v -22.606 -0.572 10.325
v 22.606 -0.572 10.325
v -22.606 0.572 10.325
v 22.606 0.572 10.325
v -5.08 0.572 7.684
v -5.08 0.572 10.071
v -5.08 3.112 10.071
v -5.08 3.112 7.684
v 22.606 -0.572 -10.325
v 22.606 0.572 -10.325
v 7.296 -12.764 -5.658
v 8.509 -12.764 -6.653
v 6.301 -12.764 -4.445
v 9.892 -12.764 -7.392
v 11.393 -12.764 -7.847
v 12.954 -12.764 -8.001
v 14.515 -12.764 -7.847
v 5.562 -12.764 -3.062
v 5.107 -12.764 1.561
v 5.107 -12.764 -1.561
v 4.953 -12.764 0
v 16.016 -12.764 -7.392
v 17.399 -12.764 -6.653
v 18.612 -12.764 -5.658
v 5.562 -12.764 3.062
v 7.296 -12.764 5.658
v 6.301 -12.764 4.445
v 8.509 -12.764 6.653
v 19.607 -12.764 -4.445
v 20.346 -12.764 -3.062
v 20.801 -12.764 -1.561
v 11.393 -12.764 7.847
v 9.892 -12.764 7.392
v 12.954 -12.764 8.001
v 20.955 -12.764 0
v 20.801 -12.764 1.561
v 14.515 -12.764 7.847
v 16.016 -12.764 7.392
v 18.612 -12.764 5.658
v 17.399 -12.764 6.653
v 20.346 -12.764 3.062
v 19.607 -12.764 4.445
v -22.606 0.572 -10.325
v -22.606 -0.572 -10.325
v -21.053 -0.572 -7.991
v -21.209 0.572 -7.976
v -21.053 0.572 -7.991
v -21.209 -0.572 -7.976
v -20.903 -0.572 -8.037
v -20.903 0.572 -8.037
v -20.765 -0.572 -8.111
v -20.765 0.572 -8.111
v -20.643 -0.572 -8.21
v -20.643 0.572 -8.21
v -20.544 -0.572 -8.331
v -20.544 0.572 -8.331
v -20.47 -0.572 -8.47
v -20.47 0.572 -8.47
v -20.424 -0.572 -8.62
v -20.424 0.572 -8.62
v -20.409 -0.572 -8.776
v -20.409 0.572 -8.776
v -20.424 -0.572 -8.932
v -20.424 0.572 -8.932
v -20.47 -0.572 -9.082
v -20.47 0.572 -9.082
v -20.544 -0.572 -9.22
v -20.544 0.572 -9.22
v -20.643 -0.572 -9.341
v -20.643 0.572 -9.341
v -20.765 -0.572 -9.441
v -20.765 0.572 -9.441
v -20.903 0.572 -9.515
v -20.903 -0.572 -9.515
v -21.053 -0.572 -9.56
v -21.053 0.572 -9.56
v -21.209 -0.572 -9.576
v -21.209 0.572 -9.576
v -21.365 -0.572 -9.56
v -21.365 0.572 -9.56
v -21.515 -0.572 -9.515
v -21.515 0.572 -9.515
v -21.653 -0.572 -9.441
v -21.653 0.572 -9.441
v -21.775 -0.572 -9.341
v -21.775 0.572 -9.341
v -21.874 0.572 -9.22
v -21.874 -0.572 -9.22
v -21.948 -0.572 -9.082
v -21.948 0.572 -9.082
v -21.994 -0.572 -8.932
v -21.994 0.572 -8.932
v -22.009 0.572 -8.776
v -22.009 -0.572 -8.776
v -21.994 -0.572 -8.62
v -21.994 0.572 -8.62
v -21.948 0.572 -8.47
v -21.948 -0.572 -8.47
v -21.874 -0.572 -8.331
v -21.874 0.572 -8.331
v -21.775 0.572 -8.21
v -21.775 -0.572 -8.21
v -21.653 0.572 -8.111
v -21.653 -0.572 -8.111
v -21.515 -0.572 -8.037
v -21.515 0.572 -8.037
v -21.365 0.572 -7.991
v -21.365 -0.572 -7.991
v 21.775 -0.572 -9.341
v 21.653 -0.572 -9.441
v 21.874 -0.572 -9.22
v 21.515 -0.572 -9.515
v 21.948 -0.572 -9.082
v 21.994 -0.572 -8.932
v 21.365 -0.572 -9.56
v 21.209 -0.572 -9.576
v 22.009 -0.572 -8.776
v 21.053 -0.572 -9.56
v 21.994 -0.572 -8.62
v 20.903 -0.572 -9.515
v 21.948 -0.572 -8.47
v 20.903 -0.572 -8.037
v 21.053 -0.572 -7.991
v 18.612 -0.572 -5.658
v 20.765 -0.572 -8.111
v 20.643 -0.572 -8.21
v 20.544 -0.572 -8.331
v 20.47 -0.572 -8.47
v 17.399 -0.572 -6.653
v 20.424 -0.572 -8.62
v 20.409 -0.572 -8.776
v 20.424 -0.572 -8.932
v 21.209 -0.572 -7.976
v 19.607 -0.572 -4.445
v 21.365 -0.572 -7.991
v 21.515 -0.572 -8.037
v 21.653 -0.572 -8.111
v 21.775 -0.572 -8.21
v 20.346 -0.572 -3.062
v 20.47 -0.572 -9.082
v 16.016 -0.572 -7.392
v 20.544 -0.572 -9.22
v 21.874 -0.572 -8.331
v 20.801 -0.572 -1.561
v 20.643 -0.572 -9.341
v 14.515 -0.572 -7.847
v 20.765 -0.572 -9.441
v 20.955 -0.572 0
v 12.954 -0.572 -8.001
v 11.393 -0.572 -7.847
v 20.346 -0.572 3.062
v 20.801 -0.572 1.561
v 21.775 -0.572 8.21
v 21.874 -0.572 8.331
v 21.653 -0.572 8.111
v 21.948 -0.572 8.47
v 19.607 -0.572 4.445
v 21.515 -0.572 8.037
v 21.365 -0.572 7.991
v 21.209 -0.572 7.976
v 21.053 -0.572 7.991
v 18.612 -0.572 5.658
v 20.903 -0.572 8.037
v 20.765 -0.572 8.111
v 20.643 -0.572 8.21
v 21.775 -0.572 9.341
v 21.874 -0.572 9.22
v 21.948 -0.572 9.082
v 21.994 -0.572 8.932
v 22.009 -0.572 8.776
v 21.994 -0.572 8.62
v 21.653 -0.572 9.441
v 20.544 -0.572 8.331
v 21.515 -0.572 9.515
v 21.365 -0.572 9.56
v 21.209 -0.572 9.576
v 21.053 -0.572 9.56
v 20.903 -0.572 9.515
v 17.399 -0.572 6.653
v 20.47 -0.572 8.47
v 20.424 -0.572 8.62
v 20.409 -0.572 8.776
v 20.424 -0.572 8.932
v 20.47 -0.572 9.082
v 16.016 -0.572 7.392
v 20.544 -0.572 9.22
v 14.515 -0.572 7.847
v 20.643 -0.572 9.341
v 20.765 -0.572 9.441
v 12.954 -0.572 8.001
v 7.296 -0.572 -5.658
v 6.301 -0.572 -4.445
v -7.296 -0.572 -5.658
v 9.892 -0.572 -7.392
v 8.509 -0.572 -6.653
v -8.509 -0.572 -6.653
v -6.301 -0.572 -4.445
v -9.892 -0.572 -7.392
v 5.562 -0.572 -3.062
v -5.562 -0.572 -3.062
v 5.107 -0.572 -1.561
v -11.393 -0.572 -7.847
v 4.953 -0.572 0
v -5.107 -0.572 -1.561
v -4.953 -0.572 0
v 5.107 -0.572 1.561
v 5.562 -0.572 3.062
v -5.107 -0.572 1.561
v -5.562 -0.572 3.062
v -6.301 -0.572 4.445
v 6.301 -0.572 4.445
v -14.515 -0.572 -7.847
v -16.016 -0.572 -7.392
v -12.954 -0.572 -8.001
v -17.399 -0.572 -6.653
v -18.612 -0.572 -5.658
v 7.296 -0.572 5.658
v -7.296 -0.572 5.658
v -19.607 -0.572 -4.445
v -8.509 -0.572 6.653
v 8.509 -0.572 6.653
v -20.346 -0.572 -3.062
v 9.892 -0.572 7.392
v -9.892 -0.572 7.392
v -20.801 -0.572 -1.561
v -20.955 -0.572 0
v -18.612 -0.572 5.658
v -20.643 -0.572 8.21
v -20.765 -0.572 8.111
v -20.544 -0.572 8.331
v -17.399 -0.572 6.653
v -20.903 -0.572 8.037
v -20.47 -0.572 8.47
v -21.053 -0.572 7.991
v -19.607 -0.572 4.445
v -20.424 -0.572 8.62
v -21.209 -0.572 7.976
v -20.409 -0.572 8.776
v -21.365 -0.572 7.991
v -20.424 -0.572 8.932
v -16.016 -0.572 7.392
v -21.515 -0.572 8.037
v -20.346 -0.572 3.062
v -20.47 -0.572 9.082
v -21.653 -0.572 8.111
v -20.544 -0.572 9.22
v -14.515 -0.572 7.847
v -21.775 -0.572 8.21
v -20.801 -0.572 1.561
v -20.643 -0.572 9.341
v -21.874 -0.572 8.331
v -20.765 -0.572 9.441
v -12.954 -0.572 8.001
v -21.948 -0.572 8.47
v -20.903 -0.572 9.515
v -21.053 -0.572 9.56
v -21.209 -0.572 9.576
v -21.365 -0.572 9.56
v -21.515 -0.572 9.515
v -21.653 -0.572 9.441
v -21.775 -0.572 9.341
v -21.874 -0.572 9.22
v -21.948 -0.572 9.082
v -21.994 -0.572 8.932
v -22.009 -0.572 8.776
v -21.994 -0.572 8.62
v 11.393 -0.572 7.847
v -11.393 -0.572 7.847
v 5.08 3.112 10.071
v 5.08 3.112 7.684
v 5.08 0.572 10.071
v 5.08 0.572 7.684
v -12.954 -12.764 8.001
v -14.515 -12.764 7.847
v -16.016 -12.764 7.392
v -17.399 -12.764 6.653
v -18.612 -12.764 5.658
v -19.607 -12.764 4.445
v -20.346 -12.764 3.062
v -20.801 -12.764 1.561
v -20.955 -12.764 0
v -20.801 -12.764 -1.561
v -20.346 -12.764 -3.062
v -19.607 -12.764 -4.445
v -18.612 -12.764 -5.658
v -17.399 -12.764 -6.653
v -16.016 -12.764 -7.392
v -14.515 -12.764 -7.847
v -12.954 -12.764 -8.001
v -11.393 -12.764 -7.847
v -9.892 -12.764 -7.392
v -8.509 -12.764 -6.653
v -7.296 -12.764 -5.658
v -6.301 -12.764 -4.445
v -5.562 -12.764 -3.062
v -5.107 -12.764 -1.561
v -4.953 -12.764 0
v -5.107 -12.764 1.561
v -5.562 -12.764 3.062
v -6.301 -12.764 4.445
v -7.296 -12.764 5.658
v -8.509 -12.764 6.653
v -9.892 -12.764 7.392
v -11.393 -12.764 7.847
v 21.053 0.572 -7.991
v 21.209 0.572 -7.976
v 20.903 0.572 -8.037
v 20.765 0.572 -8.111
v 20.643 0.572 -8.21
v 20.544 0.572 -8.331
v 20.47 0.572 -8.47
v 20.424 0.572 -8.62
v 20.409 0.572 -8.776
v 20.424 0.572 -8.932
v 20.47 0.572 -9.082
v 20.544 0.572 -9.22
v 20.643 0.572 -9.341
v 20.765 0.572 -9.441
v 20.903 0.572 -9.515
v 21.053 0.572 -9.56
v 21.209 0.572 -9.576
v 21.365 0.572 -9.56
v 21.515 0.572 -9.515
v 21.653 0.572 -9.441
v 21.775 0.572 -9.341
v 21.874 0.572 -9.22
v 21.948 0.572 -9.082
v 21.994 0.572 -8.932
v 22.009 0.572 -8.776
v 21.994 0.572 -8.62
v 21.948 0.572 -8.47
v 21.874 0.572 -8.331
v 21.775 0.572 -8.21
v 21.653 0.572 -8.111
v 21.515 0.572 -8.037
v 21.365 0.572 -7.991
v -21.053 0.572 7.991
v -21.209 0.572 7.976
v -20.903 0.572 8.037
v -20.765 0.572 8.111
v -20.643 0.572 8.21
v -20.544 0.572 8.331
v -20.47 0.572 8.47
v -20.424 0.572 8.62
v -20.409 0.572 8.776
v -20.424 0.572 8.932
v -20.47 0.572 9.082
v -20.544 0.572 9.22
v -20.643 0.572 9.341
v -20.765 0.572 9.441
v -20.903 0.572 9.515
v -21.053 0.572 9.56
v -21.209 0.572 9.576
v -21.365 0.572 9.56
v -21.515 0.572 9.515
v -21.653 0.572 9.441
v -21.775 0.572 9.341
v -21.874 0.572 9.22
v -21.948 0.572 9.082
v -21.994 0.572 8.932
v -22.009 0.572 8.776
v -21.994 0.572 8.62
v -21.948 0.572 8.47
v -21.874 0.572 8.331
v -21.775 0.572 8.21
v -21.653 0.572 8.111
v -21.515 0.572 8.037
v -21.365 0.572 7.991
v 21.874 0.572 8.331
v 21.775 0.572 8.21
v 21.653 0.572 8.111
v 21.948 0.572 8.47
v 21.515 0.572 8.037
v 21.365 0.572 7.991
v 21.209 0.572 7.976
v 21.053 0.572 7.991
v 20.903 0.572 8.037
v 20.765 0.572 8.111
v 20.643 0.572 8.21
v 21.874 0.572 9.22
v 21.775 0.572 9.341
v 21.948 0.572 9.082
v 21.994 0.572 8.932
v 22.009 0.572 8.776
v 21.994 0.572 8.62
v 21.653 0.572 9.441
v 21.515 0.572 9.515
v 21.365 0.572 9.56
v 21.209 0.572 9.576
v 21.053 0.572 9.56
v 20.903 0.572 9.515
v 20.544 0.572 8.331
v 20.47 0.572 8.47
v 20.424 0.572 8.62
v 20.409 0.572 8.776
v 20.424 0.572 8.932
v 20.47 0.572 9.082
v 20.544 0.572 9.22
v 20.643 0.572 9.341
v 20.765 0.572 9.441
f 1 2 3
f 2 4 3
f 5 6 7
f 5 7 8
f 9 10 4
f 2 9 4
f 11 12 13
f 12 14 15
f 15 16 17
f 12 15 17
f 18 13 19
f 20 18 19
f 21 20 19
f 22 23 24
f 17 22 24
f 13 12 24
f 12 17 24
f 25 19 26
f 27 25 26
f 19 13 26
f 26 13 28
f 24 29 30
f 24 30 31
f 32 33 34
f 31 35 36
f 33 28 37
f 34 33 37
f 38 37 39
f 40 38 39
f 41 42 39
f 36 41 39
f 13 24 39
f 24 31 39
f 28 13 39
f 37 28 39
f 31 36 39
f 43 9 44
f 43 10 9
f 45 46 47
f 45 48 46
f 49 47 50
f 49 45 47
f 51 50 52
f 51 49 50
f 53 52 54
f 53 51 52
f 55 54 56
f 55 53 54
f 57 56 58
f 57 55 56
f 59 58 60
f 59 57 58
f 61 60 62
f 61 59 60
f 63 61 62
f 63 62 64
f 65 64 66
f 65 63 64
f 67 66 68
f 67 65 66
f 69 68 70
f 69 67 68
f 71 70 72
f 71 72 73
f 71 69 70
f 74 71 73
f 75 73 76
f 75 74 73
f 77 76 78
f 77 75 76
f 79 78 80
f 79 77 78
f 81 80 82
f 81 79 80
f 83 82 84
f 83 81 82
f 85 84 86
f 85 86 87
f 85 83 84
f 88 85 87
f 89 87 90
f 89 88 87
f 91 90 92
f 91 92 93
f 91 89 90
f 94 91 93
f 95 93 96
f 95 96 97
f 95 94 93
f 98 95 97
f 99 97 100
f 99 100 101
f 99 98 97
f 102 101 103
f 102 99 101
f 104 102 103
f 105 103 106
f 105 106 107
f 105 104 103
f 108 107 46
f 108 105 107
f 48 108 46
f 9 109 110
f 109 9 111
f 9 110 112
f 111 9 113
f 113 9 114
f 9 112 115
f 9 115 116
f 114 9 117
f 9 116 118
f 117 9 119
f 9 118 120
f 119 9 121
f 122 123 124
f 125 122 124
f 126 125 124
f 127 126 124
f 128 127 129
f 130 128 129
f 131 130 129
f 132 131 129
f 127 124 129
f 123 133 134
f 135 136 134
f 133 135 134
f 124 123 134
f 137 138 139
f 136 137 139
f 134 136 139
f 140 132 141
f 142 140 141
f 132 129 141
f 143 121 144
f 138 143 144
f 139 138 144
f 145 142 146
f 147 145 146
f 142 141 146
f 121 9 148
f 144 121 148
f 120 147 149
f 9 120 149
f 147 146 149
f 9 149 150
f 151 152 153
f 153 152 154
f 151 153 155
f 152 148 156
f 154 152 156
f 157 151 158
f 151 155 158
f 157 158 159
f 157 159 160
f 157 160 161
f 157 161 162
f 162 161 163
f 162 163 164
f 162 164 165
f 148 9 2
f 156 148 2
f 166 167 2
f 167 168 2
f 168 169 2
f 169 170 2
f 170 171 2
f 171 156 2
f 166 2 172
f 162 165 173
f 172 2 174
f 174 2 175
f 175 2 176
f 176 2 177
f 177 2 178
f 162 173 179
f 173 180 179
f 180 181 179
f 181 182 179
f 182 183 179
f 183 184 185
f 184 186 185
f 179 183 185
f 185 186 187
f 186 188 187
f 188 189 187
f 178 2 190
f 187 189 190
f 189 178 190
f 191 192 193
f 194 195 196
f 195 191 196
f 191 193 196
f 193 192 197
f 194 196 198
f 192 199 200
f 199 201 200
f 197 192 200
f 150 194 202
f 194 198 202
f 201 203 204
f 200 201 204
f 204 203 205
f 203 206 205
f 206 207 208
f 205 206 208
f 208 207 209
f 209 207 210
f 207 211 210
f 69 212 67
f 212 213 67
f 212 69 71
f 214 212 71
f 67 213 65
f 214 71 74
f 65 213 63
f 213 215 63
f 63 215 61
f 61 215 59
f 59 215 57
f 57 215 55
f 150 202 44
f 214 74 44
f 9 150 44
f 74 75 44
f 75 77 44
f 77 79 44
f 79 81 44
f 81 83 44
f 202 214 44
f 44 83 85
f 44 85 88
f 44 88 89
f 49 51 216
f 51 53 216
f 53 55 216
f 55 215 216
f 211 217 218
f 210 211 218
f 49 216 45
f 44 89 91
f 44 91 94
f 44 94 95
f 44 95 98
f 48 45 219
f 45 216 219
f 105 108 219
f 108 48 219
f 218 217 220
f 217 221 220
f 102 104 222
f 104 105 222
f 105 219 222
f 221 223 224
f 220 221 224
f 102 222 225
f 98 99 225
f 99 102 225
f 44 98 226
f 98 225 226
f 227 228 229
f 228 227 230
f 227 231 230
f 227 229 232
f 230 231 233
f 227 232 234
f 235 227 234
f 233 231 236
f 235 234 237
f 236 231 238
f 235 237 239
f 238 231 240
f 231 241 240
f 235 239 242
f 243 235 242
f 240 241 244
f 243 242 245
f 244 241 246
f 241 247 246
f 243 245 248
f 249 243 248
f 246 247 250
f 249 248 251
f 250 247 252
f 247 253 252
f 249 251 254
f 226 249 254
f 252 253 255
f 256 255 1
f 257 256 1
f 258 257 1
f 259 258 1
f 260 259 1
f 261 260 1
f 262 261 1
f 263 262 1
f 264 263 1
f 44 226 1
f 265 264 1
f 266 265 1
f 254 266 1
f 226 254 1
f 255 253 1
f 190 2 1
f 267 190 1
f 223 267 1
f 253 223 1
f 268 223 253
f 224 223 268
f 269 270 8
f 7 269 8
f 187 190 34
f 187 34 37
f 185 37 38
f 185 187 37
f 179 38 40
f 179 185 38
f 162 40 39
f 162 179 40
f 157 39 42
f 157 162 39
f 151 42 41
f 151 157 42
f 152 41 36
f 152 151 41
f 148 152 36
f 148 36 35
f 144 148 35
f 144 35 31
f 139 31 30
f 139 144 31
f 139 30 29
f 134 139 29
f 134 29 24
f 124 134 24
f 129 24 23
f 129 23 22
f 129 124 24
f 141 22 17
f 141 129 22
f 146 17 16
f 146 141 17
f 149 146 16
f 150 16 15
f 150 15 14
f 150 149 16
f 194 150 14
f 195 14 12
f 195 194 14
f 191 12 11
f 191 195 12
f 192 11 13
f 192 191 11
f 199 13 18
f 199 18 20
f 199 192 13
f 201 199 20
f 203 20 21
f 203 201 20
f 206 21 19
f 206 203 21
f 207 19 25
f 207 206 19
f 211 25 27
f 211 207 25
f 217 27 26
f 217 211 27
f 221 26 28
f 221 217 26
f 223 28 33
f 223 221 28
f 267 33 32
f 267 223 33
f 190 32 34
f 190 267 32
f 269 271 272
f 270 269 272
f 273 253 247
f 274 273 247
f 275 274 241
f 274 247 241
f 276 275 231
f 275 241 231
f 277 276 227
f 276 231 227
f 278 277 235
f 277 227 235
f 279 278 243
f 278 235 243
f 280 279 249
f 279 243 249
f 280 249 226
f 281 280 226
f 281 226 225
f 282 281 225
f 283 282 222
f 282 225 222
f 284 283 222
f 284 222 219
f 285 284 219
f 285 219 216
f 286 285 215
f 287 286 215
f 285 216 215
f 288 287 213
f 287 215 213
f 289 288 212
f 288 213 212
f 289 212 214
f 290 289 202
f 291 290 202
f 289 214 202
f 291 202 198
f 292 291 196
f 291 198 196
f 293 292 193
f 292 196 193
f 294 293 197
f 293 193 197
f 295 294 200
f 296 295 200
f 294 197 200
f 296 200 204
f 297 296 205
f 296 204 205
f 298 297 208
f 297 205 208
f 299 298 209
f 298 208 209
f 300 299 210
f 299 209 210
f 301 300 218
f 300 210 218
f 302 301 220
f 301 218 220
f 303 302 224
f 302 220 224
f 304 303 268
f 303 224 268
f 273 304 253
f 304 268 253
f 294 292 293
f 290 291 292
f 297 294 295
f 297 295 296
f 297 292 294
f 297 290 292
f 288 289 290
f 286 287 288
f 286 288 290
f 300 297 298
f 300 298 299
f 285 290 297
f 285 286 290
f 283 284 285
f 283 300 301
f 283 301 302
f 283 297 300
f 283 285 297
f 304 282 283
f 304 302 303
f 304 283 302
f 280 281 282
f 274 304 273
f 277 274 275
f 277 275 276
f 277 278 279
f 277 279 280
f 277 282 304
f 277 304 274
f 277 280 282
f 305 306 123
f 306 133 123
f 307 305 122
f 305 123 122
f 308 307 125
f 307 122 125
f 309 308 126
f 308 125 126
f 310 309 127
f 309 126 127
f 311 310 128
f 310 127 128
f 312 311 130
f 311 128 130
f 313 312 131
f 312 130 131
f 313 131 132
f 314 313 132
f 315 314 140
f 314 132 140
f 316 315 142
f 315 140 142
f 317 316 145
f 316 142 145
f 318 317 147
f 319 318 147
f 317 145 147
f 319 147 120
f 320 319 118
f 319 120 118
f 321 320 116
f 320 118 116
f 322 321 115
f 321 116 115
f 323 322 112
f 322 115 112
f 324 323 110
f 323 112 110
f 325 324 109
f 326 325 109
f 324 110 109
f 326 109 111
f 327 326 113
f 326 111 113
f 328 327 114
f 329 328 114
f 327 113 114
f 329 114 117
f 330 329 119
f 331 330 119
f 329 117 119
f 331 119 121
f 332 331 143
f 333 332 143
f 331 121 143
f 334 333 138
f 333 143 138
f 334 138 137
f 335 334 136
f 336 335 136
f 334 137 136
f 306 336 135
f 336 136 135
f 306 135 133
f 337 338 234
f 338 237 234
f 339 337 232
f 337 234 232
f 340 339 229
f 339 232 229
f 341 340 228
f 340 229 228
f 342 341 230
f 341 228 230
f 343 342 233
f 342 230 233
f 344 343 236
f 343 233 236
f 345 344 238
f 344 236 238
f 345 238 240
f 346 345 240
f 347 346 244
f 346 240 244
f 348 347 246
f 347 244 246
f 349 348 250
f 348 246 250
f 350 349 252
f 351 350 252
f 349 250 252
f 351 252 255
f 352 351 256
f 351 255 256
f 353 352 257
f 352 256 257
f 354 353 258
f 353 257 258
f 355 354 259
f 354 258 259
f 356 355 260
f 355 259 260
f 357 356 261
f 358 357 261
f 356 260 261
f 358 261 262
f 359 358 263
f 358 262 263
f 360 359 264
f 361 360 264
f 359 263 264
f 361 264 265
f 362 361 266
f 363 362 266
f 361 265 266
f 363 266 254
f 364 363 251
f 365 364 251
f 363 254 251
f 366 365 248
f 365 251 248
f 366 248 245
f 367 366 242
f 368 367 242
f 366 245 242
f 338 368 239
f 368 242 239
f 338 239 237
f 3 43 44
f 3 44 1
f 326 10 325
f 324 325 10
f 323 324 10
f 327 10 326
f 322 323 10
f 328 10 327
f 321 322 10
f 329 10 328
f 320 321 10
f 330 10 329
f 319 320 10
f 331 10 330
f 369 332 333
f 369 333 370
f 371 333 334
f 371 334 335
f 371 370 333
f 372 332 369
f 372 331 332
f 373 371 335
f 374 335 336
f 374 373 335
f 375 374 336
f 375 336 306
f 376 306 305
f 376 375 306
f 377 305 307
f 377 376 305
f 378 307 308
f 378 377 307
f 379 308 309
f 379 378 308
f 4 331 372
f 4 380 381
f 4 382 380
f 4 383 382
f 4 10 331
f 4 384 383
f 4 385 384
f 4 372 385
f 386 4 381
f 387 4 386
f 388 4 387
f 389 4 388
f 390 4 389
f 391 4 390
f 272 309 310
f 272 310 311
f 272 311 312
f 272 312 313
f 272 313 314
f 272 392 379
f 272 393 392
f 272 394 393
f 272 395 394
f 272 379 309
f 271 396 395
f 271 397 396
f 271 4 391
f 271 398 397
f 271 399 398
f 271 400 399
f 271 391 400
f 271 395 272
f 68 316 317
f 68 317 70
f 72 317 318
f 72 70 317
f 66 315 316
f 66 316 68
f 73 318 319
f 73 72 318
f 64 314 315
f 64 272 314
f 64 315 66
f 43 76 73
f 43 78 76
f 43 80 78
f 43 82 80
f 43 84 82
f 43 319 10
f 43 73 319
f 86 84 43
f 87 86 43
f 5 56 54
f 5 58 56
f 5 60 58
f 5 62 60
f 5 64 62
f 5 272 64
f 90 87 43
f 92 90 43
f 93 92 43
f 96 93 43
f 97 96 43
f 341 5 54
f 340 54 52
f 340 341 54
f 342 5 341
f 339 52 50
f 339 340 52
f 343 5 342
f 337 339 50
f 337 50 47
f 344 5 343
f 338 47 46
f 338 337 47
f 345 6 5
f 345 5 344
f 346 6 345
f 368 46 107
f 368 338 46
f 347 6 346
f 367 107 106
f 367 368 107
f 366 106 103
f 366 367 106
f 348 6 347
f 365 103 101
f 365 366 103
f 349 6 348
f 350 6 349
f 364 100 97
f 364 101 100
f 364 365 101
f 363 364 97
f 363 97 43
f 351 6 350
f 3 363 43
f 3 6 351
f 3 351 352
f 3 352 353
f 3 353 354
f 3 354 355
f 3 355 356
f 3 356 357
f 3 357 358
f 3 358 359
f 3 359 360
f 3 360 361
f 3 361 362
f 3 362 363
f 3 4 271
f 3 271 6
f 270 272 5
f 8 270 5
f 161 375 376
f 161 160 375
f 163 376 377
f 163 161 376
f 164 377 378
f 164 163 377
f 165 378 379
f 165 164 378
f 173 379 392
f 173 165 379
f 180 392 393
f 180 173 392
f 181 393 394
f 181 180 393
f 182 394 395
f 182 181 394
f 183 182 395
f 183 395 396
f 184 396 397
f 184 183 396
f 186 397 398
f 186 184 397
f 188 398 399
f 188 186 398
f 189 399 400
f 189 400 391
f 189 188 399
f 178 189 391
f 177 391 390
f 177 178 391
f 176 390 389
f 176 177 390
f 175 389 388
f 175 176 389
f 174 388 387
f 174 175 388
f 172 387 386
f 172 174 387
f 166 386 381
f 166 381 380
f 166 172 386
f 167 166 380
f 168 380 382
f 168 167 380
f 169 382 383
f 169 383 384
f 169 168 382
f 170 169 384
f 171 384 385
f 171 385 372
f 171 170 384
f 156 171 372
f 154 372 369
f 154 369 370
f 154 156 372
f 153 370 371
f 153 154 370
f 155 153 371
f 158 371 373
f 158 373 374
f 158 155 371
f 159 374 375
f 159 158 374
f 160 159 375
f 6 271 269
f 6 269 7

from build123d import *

# Parameters (mm, degrees)
SKETCH1_W           = 22.606
SKETCH1_H           = 10.3251
SKETCH1_R           = 0.8
BOSS_EXTRUDE1_DEPTH = 0.5715
SKETCH3_W           = 5.08
SKETCH3_H           = 2.3876
BOSS_EXTRUDE2_DEPTH = 2.54
SKETCH4_R           = 8.001
BOSS_EXTRUDE3_DEPTH = 12.192


with BuildPart() as part:
    # Sketch1 → Boss-Extrude1 (new, symmetric)
    with BuildSketch(Plane(origin=(0, 0, 0), x_dir=(1, 0, 0), z_dir=(0, 1, 0))):
        with Locations((-11.303, 5.16255)):
            Rectangle(SKETCH1_W, SKETCH1_H)
        with Locations(Location((-21.209, 8.7757, 0), (0, 0, 270))):
            Circle(SKETCH1_R, mode=Mode.SUBTRACT)
    boss_extrude1 = extrude(amount=BOSS_EXTRUDE1_DEPTH, both=True)

    # Mirror1: Boss-Extrude1 across Front Plane
    add(boss_extrude1.mirror(Plane.XY))

    # Sketch3 → Boss-Extrude2 (add)
    with BuildSketch(Plane(origin=(0, 0.5715, 0), x_dir=(1, 0, 0), z_dir=(0, 1, 0))):
        with Locations((-2.54, -8.8773)):
            Rectangle(SKETCH3_W, SKETCH3_H)
    extrude(amount=BOSS_EXTRUDE2_DEPTH)

    # Sketch4 → Boss-Extrude3 (add)
    with BuildSketch(Plane.XZ.offset(0.5715)):
        with Locations(Location((-12.954, 0, 0), (0, 0, 90))):
            Circle(SKETCH4_R)
    extrude(amount=BOSS_EXTRUDE3_DEPTH)

    # Mirror3: part across plane


with BuildPart() as part_1:
    add(part.part)
    add(part.part.mirror(Plane(origin=(0, 0, 0), x_dir=(0, 0, 1), z_dir=(1, 0, 0))))


solid = part_1.part
